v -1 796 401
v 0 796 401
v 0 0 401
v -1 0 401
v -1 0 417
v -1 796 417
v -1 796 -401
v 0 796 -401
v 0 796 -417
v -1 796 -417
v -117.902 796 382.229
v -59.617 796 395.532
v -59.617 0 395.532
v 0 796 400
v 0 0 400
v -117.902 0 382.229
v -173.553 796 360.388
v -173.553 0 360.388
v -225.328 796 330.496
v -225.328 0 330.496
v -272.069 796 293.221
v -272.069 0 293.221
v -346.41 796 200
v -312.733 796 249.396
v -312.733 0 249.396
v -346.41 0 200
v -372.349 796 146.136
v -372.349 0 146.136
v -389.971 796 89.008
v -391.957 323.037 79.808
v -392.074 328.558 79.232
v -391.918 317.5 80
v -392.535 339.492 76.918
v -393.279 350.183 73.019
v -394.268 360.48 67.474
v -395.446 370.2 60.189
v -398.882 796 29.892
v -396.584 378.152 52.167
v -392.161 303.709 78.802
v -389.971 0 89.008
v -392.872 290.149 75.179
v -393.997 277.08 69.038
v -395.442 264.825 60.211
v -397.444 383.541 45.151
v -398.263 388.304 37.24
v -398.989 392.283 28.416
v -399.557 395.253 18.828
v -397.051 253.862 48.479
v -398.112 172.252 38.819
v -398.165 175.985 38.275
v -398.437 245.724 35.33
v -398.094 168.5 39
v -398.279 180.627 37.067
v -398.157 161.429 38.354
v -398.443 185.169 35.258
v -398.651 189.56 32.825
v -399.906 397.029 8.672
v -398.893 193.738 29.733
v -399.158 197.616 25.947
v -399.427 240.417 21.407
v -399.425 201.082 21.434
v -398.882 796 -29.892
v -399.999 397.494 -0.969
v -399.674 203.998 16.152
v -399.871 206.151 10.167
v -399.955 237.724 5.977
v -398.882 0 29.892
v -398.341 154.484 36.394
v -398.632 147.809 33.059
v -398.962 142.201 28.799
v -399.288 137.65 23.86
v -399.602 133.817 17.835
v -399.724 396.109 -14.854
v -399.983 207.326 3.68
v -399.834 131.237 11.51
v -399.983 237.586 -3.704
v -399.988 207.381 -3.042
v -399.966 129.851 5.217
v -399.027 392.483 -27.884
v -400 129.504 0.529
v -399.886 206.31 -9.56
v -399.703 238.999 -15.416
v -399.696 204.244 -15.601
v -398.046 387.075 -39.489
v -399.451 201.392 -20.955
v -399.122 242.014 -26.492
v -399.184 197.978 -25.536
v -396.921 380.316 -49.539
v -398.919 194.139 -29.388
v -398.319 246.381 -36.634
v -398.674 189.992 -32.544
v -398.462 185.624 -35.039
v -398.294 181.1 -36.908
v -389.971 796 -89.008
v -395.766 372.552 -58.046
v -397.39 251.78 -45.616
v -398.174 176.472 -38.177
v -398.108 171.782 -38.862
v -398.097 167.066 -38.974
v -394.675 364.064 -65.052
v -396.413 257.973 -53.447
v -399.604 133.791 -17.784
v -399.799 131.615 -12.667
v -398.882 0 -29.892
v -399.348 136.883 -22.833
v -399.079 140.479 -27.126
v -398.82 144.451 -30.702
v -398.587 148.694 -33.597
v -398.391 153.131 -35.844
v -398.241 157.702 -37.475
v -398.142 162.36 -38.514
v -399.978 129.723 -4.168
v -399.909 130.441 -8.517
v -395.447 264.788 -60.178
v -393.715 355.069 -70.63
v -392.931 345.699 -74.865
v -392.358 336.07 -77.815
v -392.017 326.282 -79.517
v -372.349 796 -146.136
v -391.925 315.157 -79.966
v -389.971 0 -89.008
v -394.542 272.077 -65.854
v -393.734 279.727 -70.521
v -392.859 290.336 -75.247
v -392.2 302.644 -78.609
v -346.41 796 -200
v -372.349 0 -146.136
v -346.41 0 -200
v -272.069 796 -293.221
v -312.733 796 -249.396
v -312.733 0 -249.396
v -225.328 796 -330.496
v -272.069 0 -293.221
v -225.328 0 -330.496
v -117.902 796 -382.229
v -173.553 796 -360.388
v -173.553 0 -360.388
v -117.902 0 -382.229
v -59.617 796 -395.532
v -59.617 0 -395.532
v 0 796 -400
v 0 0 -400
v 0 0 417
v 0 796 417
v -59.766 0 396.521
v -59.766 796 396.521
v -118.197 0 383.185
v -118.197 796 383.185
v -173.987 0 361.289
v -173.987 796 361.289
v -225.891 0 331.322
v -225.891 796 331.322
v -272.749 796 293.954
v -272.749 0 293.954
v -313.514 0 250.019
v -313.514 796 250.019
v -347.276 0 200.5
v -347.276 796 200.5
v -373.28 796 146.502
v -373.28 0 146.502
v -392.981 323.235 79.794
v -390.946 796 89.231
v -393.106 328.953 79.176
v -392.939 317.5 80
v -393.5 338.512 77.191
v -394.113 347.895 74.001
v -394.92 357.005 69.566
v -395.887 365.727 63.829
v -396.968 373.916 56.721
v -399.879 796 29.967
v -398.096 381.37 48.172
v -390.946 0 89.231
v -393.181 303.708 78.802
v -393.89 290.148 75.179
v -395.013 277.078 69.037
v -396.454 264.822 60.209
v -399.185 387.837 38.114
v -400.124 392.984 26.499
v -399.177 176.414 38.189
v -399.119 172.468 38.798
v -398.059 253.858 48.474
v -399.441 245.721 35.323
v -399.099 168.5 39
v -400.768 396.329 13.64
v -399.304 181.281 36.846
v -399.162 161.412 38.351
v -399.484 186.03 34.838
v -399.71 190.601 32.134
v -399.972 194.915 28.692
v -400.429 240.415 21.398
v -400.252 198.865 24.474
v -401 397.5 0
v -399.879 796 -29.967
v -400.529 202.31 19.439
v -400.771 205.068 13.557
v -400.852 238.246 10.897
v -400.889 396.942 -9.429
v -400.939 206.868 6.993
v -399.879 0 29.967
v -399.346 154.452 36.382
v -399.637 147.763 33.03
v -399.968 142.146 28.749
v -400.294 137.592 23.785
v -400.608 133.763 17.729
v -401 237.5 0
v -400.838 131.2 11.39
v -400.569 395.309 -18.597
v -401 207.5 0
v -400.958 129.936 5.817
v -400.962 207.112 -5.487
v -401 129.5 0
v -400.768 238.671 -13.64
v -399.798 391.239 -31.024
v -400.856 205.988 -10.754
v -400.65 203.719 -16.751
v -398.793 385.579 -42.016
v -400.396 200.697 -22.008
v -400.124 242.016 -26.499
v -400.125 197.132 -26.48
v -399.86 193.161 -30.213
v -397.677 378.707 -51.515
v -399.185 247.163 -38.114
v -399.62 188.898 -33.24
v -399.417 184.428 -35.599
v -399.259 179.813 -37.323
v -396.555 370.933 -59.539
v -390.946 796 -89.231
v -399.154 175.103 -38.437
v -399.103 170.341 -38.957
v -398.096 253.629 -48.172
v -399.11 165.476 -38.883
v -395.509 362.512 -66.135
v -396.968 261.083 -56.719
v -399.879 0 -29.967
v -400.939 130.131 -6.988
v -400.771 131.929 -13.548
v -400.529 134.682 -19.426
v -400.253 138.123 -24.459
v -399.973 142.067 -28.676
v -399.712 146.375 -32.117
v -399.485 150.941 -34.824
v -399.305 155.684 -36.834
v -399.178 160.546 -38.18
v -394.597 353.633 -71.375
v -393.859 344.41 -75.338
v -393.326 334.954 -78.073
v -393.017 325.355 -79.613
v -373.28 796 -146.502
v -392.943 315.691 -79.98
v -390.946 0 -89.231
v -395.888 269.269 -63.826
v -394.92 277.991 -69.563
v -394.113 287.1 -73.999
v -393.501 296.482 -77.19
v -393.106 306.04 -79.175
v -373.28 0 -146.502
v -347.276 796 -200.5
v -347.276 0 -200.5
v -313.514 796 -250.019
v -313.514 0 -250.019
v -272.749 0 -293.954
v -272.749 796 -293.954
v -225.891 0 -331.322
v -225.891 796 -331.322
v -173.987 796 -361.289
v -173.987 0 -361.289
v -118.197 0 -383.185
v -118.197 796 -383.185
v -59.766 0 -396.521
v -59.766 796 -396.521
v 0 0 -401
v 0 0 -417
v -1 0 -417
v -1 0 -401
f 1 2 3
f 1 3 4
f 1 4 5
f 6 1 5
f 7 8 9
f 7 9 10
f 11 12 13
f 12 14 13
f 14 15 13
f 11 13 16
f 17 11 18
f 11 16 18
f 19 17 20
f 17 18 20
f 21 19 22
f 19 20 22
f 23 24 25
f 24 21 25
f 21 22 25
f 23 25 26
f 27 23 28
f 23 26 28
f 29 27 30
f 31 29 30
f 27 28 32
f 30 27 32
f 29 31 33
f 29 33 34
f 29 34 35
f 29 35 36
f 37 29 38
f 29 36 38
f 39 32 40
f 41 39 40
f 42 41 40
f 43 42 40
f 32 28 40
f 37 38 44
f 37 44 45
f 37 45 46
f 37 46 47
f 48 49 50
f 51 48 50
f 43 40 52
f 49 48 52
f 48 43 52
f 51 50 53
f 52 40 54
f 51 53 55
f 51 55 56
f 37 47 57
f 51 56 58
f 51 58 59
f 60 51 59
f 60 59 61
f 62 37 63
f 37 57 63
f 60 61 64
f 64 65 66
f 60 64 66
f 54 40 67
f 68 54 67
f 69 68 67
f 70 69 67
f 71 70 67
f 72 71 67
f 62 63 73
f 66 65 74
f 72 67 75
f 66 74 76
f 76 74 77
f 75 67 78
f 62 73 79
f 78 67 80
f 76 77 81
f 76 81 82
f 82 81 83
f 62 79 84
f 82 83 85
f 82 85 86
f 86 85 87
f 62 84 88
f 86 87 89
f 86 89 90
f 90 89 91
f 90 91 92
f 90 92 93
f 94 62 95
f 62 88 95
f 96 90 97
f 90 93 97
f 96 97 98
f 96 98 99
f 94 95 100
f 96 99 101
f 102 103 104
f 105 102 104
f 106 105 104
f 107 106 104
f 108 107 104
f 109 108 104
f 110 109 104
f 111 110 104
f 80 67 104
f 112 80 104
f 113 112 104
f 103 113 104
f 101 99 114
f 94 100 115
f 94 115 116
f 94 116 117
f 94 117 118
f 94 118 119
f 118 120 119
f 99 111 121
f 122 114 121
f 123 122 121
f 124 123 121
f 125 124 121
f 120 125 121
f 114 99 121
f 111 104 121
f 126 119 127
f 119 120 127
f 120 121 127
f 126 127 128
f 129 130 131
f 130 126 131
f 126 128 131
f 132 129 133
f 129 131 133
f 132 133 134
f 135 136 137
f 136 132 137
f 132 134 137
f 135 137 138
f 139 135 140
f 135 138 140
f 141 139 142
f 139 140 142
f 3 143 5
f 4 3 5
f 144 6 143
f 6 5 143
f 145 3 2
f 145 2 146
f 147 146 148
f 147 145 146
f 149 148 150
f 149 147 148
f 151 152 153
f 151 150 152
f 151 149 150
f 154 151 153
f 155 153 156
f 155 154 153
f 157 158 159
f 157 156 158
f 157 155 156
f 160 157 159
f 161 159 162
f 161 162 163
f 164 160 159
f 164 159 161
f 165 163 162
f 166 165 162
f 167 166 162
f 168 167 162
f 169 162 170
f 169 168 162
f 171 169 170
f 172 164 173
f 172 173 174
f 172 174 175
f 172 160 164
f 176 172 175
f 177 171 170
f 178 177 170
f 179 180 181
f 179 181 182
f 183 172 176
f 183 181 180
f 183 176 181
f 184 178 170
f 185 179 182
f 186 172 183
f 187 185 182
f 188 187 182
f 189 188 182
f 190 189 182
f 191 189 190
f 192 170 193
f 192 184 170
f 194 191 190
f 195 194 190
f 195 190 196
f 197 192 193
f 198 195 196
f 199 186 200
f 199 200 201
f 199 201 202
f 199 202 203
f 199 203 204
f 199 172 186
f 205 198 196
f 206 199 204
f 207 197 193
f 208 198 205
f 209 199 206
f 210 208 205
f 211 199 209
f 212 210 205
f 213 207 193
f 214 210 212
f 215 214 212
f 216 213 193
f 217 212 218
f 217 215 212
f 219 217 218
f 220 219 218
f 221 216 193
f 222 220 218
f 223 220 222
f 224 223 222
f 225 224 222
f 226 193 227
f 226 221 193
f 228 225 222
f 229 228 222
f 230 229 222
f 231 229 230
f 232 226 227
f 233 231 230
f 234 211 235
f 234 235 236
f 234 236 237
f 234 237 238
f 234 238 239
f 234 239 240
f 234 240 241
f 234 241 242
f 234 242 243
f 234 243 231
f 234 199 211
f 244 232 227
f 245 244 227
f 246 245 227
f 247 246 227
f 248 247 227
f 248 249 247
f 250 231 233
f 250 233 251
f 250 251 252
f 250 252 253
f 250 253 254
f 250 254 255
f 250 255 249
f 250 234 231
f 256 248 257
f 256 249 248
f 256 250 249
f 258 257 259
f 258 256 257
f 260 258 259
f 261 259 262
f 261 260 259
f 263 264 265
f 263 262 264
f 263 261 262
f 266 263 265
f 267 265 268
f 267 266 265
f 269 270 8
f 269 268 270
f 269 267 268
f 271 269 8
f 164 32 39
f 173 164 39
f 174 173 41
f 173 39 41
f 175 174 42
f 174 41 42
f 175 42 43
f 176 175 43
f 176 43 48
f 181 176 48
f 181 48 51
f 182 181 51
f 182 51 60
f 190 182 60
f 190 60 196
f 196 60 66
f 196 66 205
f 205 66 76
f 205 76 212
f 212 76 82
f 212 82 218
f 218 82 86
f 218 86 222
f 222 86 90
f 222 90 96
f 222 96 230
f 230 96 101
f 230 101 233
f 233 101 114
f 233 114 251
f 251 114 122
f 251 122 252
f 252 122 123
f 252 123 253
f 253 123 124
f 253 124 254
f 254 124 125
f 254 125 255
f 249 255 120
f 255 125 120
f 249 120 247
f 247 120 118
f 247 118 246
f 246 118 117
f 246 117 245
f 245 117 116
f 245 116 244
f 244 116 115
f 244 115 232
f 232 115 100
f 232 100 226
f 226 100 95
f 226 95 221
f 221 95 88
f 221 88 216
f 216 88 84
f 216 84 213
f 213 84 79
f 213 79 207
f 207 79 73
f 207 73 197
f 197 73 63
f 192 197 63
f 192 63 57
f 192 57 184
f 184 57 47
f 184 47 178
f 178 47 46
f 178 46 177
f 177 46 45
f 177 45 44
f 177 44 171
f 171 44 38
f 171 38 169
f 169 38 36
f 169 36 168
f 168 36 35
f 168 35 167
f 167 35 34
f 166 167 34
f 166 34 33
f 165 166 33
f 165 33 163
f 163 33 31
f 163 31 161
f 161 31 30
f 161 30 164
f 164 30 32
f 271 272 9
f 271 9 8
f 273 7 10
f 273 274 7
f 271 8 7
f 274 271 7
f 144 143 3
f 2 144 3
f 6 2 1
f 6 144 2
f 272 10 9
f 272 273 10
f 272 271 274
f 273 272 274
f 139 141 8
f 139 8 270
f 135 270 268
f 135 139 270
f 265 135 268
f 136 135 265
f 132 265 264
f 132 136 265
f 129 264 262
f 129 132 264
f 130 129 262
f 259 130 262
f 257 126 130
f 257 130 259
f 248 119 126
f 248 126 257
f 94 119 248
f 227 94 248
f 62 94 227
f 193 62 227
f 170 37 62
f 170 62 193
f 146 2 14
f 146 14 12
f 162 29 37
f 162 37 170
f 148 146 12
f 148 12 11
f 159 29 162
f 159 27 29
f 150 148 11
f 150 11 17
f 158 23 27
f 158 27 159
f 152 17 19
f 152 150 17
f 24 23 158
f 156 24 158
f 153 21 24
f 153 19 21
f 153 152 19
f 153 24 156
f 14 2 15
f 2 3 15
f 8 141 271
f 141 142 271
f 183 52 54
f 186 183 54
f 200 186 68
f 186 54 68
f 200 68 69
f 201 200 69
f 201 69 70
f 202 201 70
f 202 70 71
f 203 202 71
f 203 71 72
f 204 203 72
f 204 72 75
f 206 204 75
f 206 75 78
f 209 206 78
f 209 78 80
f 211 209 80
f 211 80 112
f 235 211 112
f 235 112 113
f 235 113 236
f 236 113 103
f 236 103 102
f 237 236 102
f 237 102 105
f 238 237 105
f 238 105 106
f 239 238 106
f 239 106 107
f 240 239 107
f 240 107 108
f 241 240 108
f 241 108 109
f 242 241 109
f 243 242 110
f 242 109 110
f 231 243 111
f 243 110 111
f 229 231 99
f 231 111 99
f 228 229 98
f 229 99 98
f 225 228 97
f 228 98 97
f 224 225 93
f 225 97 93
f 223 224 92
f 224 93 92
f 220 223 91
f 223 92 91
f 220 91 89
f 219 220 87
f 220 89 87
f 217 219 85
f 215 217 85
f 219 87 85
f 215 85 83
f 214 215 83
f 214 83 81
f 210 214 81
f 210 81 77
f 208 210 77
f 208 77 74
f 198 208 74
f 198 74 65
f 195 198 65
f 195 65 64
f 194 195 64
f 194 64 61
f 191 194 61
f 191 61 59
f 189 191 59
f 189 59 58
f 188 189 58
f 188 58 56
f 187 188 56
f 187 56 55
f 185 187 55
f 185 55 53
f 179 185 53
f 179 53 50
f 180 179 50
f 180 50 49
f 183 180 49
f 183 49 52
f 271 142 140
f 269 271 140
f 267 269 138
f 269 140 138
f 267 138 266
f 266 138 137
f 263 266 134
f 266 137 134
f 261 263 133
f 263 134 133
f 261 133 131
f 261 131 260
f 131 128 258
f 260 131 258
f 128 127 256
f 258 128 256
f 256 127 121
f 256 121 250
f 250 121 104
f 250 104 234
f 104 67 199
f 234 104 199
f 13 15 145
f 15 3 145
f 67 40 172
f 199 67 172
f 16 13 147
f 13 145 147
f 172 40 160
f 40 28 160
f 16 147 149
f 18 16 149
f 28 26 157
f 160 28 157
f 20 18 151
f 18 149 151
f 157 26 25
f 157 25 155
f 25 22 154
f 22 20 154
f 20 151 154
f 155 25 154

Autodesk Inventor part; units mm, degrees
ref_plane "YZ Plane" through (0, 0, 0) normal (1, 0, 0) x (0, 1, 0)
ref_plane "XZ Plane" through (0, 0, 0) normal (0, 1, 0) x (-1, 0, 0)
sketch "Sketch1" plane through (0, 0, 0) normal (0, 1, 0) x (-1, 0, 0)
  arc A0 (0, -401) -> (0, 401) centre (0, 0) ccw
  line L0 (0, 0) -> (0, 401) construction
  line L1 (0, 0) -> (401, 0) construction
  line L2 (0, 0) -> (0, -401) construction
  arc A1 (0, -400) -> (0, 400) centre (0, 0) ccw
  line L3 (0, 0) -> (0, 400) construction
  line L4 (0, 0) -> (0, -400) construction
  line L5 (0, 401) -> (0, 400)
  line L6 (0, -400) -> (0, -401)
  dimension "d0" = 401
  dimension "d1" = 90
  dimension "d2" = 180
  dimension "d3" = 400
  dimension "d4" = 180
extrude "Extrusion1" add sketch "Sketch1" along normal blind 796
sketch "Sketch2" plane through (0, 0, 0) normal (0, 1, 0) x (-1, 0, 0)
  line L0 (0, -401) -> (1, -401)
  line L1 (1, -401) -> (1, -417)
  line L2 (1, -417) -> (0, -417)
  line L3 (0, -417) -> (0, -401)
  point P0 (0, 0)
  dimension "d7" = 1
  dimension "d8" = 16
extrude "Extrusion2" add sketch "Sketch2" along normal blind 796
sketch "Sketch3" plane through (0, 0, 0) normal (0, 1, 0) x (-1, 0, 0)
  line L0 (0, 401) -> (1, 401)
  line L1 (1, 401) -> (1, 417)
  line L2 (1, 417) -> (0, 417)
  line L3 (0, 417) -> (0, 401)
  point P0 (0, 0)
  dimension "d11" = 1
  dimension "d12" = 16
extrude "Extrusion3" add sketch "Sketch3" along normal blind 796
sketch "Sketch4" plane through (0, 0, 0) normal (0, 1, 0) x (-1, 0, 0)
  line L0 (0, 0) -> (401, 0)
  dimension "d15" = 401
ref_plane "Work Plane1" through (-401, 0, 0) normal (-1, 0, 0) x (0, -1, 0)
sketch "Sketch5" plane through (-401, 0, 0) normal (-1, 0, 0) x (0, -1, 0)
  circle A0 centre (-168.5, 0) radius 39
  line L0 (-796, 401) -> (-796, -401) projected
  point P0 (0, 0)
  dimension "d16" = 78
  dimension "d17" = 627.5
hole "Hole1" at (-401, 168.5, 0) direction (1, 0, 0) diameter 78 end through all
sketch "Sketch6" plane through (-401, 0, 0) normal (-1, 0, 0) x (0, -1, 0)
  circle A0 centre (-317.5, 0) radius 80
  line L0 (-796, 401) -> (-796, -401) projected
  point P0 (0, 0)
  dimension "d25" = 160
  dimension "d26" = 478.5
hole "Hole2" at (-401, 317.5, 0) direction (1, 0, 0) diameter 160 end through all
properties part number "Upper Front Half"
